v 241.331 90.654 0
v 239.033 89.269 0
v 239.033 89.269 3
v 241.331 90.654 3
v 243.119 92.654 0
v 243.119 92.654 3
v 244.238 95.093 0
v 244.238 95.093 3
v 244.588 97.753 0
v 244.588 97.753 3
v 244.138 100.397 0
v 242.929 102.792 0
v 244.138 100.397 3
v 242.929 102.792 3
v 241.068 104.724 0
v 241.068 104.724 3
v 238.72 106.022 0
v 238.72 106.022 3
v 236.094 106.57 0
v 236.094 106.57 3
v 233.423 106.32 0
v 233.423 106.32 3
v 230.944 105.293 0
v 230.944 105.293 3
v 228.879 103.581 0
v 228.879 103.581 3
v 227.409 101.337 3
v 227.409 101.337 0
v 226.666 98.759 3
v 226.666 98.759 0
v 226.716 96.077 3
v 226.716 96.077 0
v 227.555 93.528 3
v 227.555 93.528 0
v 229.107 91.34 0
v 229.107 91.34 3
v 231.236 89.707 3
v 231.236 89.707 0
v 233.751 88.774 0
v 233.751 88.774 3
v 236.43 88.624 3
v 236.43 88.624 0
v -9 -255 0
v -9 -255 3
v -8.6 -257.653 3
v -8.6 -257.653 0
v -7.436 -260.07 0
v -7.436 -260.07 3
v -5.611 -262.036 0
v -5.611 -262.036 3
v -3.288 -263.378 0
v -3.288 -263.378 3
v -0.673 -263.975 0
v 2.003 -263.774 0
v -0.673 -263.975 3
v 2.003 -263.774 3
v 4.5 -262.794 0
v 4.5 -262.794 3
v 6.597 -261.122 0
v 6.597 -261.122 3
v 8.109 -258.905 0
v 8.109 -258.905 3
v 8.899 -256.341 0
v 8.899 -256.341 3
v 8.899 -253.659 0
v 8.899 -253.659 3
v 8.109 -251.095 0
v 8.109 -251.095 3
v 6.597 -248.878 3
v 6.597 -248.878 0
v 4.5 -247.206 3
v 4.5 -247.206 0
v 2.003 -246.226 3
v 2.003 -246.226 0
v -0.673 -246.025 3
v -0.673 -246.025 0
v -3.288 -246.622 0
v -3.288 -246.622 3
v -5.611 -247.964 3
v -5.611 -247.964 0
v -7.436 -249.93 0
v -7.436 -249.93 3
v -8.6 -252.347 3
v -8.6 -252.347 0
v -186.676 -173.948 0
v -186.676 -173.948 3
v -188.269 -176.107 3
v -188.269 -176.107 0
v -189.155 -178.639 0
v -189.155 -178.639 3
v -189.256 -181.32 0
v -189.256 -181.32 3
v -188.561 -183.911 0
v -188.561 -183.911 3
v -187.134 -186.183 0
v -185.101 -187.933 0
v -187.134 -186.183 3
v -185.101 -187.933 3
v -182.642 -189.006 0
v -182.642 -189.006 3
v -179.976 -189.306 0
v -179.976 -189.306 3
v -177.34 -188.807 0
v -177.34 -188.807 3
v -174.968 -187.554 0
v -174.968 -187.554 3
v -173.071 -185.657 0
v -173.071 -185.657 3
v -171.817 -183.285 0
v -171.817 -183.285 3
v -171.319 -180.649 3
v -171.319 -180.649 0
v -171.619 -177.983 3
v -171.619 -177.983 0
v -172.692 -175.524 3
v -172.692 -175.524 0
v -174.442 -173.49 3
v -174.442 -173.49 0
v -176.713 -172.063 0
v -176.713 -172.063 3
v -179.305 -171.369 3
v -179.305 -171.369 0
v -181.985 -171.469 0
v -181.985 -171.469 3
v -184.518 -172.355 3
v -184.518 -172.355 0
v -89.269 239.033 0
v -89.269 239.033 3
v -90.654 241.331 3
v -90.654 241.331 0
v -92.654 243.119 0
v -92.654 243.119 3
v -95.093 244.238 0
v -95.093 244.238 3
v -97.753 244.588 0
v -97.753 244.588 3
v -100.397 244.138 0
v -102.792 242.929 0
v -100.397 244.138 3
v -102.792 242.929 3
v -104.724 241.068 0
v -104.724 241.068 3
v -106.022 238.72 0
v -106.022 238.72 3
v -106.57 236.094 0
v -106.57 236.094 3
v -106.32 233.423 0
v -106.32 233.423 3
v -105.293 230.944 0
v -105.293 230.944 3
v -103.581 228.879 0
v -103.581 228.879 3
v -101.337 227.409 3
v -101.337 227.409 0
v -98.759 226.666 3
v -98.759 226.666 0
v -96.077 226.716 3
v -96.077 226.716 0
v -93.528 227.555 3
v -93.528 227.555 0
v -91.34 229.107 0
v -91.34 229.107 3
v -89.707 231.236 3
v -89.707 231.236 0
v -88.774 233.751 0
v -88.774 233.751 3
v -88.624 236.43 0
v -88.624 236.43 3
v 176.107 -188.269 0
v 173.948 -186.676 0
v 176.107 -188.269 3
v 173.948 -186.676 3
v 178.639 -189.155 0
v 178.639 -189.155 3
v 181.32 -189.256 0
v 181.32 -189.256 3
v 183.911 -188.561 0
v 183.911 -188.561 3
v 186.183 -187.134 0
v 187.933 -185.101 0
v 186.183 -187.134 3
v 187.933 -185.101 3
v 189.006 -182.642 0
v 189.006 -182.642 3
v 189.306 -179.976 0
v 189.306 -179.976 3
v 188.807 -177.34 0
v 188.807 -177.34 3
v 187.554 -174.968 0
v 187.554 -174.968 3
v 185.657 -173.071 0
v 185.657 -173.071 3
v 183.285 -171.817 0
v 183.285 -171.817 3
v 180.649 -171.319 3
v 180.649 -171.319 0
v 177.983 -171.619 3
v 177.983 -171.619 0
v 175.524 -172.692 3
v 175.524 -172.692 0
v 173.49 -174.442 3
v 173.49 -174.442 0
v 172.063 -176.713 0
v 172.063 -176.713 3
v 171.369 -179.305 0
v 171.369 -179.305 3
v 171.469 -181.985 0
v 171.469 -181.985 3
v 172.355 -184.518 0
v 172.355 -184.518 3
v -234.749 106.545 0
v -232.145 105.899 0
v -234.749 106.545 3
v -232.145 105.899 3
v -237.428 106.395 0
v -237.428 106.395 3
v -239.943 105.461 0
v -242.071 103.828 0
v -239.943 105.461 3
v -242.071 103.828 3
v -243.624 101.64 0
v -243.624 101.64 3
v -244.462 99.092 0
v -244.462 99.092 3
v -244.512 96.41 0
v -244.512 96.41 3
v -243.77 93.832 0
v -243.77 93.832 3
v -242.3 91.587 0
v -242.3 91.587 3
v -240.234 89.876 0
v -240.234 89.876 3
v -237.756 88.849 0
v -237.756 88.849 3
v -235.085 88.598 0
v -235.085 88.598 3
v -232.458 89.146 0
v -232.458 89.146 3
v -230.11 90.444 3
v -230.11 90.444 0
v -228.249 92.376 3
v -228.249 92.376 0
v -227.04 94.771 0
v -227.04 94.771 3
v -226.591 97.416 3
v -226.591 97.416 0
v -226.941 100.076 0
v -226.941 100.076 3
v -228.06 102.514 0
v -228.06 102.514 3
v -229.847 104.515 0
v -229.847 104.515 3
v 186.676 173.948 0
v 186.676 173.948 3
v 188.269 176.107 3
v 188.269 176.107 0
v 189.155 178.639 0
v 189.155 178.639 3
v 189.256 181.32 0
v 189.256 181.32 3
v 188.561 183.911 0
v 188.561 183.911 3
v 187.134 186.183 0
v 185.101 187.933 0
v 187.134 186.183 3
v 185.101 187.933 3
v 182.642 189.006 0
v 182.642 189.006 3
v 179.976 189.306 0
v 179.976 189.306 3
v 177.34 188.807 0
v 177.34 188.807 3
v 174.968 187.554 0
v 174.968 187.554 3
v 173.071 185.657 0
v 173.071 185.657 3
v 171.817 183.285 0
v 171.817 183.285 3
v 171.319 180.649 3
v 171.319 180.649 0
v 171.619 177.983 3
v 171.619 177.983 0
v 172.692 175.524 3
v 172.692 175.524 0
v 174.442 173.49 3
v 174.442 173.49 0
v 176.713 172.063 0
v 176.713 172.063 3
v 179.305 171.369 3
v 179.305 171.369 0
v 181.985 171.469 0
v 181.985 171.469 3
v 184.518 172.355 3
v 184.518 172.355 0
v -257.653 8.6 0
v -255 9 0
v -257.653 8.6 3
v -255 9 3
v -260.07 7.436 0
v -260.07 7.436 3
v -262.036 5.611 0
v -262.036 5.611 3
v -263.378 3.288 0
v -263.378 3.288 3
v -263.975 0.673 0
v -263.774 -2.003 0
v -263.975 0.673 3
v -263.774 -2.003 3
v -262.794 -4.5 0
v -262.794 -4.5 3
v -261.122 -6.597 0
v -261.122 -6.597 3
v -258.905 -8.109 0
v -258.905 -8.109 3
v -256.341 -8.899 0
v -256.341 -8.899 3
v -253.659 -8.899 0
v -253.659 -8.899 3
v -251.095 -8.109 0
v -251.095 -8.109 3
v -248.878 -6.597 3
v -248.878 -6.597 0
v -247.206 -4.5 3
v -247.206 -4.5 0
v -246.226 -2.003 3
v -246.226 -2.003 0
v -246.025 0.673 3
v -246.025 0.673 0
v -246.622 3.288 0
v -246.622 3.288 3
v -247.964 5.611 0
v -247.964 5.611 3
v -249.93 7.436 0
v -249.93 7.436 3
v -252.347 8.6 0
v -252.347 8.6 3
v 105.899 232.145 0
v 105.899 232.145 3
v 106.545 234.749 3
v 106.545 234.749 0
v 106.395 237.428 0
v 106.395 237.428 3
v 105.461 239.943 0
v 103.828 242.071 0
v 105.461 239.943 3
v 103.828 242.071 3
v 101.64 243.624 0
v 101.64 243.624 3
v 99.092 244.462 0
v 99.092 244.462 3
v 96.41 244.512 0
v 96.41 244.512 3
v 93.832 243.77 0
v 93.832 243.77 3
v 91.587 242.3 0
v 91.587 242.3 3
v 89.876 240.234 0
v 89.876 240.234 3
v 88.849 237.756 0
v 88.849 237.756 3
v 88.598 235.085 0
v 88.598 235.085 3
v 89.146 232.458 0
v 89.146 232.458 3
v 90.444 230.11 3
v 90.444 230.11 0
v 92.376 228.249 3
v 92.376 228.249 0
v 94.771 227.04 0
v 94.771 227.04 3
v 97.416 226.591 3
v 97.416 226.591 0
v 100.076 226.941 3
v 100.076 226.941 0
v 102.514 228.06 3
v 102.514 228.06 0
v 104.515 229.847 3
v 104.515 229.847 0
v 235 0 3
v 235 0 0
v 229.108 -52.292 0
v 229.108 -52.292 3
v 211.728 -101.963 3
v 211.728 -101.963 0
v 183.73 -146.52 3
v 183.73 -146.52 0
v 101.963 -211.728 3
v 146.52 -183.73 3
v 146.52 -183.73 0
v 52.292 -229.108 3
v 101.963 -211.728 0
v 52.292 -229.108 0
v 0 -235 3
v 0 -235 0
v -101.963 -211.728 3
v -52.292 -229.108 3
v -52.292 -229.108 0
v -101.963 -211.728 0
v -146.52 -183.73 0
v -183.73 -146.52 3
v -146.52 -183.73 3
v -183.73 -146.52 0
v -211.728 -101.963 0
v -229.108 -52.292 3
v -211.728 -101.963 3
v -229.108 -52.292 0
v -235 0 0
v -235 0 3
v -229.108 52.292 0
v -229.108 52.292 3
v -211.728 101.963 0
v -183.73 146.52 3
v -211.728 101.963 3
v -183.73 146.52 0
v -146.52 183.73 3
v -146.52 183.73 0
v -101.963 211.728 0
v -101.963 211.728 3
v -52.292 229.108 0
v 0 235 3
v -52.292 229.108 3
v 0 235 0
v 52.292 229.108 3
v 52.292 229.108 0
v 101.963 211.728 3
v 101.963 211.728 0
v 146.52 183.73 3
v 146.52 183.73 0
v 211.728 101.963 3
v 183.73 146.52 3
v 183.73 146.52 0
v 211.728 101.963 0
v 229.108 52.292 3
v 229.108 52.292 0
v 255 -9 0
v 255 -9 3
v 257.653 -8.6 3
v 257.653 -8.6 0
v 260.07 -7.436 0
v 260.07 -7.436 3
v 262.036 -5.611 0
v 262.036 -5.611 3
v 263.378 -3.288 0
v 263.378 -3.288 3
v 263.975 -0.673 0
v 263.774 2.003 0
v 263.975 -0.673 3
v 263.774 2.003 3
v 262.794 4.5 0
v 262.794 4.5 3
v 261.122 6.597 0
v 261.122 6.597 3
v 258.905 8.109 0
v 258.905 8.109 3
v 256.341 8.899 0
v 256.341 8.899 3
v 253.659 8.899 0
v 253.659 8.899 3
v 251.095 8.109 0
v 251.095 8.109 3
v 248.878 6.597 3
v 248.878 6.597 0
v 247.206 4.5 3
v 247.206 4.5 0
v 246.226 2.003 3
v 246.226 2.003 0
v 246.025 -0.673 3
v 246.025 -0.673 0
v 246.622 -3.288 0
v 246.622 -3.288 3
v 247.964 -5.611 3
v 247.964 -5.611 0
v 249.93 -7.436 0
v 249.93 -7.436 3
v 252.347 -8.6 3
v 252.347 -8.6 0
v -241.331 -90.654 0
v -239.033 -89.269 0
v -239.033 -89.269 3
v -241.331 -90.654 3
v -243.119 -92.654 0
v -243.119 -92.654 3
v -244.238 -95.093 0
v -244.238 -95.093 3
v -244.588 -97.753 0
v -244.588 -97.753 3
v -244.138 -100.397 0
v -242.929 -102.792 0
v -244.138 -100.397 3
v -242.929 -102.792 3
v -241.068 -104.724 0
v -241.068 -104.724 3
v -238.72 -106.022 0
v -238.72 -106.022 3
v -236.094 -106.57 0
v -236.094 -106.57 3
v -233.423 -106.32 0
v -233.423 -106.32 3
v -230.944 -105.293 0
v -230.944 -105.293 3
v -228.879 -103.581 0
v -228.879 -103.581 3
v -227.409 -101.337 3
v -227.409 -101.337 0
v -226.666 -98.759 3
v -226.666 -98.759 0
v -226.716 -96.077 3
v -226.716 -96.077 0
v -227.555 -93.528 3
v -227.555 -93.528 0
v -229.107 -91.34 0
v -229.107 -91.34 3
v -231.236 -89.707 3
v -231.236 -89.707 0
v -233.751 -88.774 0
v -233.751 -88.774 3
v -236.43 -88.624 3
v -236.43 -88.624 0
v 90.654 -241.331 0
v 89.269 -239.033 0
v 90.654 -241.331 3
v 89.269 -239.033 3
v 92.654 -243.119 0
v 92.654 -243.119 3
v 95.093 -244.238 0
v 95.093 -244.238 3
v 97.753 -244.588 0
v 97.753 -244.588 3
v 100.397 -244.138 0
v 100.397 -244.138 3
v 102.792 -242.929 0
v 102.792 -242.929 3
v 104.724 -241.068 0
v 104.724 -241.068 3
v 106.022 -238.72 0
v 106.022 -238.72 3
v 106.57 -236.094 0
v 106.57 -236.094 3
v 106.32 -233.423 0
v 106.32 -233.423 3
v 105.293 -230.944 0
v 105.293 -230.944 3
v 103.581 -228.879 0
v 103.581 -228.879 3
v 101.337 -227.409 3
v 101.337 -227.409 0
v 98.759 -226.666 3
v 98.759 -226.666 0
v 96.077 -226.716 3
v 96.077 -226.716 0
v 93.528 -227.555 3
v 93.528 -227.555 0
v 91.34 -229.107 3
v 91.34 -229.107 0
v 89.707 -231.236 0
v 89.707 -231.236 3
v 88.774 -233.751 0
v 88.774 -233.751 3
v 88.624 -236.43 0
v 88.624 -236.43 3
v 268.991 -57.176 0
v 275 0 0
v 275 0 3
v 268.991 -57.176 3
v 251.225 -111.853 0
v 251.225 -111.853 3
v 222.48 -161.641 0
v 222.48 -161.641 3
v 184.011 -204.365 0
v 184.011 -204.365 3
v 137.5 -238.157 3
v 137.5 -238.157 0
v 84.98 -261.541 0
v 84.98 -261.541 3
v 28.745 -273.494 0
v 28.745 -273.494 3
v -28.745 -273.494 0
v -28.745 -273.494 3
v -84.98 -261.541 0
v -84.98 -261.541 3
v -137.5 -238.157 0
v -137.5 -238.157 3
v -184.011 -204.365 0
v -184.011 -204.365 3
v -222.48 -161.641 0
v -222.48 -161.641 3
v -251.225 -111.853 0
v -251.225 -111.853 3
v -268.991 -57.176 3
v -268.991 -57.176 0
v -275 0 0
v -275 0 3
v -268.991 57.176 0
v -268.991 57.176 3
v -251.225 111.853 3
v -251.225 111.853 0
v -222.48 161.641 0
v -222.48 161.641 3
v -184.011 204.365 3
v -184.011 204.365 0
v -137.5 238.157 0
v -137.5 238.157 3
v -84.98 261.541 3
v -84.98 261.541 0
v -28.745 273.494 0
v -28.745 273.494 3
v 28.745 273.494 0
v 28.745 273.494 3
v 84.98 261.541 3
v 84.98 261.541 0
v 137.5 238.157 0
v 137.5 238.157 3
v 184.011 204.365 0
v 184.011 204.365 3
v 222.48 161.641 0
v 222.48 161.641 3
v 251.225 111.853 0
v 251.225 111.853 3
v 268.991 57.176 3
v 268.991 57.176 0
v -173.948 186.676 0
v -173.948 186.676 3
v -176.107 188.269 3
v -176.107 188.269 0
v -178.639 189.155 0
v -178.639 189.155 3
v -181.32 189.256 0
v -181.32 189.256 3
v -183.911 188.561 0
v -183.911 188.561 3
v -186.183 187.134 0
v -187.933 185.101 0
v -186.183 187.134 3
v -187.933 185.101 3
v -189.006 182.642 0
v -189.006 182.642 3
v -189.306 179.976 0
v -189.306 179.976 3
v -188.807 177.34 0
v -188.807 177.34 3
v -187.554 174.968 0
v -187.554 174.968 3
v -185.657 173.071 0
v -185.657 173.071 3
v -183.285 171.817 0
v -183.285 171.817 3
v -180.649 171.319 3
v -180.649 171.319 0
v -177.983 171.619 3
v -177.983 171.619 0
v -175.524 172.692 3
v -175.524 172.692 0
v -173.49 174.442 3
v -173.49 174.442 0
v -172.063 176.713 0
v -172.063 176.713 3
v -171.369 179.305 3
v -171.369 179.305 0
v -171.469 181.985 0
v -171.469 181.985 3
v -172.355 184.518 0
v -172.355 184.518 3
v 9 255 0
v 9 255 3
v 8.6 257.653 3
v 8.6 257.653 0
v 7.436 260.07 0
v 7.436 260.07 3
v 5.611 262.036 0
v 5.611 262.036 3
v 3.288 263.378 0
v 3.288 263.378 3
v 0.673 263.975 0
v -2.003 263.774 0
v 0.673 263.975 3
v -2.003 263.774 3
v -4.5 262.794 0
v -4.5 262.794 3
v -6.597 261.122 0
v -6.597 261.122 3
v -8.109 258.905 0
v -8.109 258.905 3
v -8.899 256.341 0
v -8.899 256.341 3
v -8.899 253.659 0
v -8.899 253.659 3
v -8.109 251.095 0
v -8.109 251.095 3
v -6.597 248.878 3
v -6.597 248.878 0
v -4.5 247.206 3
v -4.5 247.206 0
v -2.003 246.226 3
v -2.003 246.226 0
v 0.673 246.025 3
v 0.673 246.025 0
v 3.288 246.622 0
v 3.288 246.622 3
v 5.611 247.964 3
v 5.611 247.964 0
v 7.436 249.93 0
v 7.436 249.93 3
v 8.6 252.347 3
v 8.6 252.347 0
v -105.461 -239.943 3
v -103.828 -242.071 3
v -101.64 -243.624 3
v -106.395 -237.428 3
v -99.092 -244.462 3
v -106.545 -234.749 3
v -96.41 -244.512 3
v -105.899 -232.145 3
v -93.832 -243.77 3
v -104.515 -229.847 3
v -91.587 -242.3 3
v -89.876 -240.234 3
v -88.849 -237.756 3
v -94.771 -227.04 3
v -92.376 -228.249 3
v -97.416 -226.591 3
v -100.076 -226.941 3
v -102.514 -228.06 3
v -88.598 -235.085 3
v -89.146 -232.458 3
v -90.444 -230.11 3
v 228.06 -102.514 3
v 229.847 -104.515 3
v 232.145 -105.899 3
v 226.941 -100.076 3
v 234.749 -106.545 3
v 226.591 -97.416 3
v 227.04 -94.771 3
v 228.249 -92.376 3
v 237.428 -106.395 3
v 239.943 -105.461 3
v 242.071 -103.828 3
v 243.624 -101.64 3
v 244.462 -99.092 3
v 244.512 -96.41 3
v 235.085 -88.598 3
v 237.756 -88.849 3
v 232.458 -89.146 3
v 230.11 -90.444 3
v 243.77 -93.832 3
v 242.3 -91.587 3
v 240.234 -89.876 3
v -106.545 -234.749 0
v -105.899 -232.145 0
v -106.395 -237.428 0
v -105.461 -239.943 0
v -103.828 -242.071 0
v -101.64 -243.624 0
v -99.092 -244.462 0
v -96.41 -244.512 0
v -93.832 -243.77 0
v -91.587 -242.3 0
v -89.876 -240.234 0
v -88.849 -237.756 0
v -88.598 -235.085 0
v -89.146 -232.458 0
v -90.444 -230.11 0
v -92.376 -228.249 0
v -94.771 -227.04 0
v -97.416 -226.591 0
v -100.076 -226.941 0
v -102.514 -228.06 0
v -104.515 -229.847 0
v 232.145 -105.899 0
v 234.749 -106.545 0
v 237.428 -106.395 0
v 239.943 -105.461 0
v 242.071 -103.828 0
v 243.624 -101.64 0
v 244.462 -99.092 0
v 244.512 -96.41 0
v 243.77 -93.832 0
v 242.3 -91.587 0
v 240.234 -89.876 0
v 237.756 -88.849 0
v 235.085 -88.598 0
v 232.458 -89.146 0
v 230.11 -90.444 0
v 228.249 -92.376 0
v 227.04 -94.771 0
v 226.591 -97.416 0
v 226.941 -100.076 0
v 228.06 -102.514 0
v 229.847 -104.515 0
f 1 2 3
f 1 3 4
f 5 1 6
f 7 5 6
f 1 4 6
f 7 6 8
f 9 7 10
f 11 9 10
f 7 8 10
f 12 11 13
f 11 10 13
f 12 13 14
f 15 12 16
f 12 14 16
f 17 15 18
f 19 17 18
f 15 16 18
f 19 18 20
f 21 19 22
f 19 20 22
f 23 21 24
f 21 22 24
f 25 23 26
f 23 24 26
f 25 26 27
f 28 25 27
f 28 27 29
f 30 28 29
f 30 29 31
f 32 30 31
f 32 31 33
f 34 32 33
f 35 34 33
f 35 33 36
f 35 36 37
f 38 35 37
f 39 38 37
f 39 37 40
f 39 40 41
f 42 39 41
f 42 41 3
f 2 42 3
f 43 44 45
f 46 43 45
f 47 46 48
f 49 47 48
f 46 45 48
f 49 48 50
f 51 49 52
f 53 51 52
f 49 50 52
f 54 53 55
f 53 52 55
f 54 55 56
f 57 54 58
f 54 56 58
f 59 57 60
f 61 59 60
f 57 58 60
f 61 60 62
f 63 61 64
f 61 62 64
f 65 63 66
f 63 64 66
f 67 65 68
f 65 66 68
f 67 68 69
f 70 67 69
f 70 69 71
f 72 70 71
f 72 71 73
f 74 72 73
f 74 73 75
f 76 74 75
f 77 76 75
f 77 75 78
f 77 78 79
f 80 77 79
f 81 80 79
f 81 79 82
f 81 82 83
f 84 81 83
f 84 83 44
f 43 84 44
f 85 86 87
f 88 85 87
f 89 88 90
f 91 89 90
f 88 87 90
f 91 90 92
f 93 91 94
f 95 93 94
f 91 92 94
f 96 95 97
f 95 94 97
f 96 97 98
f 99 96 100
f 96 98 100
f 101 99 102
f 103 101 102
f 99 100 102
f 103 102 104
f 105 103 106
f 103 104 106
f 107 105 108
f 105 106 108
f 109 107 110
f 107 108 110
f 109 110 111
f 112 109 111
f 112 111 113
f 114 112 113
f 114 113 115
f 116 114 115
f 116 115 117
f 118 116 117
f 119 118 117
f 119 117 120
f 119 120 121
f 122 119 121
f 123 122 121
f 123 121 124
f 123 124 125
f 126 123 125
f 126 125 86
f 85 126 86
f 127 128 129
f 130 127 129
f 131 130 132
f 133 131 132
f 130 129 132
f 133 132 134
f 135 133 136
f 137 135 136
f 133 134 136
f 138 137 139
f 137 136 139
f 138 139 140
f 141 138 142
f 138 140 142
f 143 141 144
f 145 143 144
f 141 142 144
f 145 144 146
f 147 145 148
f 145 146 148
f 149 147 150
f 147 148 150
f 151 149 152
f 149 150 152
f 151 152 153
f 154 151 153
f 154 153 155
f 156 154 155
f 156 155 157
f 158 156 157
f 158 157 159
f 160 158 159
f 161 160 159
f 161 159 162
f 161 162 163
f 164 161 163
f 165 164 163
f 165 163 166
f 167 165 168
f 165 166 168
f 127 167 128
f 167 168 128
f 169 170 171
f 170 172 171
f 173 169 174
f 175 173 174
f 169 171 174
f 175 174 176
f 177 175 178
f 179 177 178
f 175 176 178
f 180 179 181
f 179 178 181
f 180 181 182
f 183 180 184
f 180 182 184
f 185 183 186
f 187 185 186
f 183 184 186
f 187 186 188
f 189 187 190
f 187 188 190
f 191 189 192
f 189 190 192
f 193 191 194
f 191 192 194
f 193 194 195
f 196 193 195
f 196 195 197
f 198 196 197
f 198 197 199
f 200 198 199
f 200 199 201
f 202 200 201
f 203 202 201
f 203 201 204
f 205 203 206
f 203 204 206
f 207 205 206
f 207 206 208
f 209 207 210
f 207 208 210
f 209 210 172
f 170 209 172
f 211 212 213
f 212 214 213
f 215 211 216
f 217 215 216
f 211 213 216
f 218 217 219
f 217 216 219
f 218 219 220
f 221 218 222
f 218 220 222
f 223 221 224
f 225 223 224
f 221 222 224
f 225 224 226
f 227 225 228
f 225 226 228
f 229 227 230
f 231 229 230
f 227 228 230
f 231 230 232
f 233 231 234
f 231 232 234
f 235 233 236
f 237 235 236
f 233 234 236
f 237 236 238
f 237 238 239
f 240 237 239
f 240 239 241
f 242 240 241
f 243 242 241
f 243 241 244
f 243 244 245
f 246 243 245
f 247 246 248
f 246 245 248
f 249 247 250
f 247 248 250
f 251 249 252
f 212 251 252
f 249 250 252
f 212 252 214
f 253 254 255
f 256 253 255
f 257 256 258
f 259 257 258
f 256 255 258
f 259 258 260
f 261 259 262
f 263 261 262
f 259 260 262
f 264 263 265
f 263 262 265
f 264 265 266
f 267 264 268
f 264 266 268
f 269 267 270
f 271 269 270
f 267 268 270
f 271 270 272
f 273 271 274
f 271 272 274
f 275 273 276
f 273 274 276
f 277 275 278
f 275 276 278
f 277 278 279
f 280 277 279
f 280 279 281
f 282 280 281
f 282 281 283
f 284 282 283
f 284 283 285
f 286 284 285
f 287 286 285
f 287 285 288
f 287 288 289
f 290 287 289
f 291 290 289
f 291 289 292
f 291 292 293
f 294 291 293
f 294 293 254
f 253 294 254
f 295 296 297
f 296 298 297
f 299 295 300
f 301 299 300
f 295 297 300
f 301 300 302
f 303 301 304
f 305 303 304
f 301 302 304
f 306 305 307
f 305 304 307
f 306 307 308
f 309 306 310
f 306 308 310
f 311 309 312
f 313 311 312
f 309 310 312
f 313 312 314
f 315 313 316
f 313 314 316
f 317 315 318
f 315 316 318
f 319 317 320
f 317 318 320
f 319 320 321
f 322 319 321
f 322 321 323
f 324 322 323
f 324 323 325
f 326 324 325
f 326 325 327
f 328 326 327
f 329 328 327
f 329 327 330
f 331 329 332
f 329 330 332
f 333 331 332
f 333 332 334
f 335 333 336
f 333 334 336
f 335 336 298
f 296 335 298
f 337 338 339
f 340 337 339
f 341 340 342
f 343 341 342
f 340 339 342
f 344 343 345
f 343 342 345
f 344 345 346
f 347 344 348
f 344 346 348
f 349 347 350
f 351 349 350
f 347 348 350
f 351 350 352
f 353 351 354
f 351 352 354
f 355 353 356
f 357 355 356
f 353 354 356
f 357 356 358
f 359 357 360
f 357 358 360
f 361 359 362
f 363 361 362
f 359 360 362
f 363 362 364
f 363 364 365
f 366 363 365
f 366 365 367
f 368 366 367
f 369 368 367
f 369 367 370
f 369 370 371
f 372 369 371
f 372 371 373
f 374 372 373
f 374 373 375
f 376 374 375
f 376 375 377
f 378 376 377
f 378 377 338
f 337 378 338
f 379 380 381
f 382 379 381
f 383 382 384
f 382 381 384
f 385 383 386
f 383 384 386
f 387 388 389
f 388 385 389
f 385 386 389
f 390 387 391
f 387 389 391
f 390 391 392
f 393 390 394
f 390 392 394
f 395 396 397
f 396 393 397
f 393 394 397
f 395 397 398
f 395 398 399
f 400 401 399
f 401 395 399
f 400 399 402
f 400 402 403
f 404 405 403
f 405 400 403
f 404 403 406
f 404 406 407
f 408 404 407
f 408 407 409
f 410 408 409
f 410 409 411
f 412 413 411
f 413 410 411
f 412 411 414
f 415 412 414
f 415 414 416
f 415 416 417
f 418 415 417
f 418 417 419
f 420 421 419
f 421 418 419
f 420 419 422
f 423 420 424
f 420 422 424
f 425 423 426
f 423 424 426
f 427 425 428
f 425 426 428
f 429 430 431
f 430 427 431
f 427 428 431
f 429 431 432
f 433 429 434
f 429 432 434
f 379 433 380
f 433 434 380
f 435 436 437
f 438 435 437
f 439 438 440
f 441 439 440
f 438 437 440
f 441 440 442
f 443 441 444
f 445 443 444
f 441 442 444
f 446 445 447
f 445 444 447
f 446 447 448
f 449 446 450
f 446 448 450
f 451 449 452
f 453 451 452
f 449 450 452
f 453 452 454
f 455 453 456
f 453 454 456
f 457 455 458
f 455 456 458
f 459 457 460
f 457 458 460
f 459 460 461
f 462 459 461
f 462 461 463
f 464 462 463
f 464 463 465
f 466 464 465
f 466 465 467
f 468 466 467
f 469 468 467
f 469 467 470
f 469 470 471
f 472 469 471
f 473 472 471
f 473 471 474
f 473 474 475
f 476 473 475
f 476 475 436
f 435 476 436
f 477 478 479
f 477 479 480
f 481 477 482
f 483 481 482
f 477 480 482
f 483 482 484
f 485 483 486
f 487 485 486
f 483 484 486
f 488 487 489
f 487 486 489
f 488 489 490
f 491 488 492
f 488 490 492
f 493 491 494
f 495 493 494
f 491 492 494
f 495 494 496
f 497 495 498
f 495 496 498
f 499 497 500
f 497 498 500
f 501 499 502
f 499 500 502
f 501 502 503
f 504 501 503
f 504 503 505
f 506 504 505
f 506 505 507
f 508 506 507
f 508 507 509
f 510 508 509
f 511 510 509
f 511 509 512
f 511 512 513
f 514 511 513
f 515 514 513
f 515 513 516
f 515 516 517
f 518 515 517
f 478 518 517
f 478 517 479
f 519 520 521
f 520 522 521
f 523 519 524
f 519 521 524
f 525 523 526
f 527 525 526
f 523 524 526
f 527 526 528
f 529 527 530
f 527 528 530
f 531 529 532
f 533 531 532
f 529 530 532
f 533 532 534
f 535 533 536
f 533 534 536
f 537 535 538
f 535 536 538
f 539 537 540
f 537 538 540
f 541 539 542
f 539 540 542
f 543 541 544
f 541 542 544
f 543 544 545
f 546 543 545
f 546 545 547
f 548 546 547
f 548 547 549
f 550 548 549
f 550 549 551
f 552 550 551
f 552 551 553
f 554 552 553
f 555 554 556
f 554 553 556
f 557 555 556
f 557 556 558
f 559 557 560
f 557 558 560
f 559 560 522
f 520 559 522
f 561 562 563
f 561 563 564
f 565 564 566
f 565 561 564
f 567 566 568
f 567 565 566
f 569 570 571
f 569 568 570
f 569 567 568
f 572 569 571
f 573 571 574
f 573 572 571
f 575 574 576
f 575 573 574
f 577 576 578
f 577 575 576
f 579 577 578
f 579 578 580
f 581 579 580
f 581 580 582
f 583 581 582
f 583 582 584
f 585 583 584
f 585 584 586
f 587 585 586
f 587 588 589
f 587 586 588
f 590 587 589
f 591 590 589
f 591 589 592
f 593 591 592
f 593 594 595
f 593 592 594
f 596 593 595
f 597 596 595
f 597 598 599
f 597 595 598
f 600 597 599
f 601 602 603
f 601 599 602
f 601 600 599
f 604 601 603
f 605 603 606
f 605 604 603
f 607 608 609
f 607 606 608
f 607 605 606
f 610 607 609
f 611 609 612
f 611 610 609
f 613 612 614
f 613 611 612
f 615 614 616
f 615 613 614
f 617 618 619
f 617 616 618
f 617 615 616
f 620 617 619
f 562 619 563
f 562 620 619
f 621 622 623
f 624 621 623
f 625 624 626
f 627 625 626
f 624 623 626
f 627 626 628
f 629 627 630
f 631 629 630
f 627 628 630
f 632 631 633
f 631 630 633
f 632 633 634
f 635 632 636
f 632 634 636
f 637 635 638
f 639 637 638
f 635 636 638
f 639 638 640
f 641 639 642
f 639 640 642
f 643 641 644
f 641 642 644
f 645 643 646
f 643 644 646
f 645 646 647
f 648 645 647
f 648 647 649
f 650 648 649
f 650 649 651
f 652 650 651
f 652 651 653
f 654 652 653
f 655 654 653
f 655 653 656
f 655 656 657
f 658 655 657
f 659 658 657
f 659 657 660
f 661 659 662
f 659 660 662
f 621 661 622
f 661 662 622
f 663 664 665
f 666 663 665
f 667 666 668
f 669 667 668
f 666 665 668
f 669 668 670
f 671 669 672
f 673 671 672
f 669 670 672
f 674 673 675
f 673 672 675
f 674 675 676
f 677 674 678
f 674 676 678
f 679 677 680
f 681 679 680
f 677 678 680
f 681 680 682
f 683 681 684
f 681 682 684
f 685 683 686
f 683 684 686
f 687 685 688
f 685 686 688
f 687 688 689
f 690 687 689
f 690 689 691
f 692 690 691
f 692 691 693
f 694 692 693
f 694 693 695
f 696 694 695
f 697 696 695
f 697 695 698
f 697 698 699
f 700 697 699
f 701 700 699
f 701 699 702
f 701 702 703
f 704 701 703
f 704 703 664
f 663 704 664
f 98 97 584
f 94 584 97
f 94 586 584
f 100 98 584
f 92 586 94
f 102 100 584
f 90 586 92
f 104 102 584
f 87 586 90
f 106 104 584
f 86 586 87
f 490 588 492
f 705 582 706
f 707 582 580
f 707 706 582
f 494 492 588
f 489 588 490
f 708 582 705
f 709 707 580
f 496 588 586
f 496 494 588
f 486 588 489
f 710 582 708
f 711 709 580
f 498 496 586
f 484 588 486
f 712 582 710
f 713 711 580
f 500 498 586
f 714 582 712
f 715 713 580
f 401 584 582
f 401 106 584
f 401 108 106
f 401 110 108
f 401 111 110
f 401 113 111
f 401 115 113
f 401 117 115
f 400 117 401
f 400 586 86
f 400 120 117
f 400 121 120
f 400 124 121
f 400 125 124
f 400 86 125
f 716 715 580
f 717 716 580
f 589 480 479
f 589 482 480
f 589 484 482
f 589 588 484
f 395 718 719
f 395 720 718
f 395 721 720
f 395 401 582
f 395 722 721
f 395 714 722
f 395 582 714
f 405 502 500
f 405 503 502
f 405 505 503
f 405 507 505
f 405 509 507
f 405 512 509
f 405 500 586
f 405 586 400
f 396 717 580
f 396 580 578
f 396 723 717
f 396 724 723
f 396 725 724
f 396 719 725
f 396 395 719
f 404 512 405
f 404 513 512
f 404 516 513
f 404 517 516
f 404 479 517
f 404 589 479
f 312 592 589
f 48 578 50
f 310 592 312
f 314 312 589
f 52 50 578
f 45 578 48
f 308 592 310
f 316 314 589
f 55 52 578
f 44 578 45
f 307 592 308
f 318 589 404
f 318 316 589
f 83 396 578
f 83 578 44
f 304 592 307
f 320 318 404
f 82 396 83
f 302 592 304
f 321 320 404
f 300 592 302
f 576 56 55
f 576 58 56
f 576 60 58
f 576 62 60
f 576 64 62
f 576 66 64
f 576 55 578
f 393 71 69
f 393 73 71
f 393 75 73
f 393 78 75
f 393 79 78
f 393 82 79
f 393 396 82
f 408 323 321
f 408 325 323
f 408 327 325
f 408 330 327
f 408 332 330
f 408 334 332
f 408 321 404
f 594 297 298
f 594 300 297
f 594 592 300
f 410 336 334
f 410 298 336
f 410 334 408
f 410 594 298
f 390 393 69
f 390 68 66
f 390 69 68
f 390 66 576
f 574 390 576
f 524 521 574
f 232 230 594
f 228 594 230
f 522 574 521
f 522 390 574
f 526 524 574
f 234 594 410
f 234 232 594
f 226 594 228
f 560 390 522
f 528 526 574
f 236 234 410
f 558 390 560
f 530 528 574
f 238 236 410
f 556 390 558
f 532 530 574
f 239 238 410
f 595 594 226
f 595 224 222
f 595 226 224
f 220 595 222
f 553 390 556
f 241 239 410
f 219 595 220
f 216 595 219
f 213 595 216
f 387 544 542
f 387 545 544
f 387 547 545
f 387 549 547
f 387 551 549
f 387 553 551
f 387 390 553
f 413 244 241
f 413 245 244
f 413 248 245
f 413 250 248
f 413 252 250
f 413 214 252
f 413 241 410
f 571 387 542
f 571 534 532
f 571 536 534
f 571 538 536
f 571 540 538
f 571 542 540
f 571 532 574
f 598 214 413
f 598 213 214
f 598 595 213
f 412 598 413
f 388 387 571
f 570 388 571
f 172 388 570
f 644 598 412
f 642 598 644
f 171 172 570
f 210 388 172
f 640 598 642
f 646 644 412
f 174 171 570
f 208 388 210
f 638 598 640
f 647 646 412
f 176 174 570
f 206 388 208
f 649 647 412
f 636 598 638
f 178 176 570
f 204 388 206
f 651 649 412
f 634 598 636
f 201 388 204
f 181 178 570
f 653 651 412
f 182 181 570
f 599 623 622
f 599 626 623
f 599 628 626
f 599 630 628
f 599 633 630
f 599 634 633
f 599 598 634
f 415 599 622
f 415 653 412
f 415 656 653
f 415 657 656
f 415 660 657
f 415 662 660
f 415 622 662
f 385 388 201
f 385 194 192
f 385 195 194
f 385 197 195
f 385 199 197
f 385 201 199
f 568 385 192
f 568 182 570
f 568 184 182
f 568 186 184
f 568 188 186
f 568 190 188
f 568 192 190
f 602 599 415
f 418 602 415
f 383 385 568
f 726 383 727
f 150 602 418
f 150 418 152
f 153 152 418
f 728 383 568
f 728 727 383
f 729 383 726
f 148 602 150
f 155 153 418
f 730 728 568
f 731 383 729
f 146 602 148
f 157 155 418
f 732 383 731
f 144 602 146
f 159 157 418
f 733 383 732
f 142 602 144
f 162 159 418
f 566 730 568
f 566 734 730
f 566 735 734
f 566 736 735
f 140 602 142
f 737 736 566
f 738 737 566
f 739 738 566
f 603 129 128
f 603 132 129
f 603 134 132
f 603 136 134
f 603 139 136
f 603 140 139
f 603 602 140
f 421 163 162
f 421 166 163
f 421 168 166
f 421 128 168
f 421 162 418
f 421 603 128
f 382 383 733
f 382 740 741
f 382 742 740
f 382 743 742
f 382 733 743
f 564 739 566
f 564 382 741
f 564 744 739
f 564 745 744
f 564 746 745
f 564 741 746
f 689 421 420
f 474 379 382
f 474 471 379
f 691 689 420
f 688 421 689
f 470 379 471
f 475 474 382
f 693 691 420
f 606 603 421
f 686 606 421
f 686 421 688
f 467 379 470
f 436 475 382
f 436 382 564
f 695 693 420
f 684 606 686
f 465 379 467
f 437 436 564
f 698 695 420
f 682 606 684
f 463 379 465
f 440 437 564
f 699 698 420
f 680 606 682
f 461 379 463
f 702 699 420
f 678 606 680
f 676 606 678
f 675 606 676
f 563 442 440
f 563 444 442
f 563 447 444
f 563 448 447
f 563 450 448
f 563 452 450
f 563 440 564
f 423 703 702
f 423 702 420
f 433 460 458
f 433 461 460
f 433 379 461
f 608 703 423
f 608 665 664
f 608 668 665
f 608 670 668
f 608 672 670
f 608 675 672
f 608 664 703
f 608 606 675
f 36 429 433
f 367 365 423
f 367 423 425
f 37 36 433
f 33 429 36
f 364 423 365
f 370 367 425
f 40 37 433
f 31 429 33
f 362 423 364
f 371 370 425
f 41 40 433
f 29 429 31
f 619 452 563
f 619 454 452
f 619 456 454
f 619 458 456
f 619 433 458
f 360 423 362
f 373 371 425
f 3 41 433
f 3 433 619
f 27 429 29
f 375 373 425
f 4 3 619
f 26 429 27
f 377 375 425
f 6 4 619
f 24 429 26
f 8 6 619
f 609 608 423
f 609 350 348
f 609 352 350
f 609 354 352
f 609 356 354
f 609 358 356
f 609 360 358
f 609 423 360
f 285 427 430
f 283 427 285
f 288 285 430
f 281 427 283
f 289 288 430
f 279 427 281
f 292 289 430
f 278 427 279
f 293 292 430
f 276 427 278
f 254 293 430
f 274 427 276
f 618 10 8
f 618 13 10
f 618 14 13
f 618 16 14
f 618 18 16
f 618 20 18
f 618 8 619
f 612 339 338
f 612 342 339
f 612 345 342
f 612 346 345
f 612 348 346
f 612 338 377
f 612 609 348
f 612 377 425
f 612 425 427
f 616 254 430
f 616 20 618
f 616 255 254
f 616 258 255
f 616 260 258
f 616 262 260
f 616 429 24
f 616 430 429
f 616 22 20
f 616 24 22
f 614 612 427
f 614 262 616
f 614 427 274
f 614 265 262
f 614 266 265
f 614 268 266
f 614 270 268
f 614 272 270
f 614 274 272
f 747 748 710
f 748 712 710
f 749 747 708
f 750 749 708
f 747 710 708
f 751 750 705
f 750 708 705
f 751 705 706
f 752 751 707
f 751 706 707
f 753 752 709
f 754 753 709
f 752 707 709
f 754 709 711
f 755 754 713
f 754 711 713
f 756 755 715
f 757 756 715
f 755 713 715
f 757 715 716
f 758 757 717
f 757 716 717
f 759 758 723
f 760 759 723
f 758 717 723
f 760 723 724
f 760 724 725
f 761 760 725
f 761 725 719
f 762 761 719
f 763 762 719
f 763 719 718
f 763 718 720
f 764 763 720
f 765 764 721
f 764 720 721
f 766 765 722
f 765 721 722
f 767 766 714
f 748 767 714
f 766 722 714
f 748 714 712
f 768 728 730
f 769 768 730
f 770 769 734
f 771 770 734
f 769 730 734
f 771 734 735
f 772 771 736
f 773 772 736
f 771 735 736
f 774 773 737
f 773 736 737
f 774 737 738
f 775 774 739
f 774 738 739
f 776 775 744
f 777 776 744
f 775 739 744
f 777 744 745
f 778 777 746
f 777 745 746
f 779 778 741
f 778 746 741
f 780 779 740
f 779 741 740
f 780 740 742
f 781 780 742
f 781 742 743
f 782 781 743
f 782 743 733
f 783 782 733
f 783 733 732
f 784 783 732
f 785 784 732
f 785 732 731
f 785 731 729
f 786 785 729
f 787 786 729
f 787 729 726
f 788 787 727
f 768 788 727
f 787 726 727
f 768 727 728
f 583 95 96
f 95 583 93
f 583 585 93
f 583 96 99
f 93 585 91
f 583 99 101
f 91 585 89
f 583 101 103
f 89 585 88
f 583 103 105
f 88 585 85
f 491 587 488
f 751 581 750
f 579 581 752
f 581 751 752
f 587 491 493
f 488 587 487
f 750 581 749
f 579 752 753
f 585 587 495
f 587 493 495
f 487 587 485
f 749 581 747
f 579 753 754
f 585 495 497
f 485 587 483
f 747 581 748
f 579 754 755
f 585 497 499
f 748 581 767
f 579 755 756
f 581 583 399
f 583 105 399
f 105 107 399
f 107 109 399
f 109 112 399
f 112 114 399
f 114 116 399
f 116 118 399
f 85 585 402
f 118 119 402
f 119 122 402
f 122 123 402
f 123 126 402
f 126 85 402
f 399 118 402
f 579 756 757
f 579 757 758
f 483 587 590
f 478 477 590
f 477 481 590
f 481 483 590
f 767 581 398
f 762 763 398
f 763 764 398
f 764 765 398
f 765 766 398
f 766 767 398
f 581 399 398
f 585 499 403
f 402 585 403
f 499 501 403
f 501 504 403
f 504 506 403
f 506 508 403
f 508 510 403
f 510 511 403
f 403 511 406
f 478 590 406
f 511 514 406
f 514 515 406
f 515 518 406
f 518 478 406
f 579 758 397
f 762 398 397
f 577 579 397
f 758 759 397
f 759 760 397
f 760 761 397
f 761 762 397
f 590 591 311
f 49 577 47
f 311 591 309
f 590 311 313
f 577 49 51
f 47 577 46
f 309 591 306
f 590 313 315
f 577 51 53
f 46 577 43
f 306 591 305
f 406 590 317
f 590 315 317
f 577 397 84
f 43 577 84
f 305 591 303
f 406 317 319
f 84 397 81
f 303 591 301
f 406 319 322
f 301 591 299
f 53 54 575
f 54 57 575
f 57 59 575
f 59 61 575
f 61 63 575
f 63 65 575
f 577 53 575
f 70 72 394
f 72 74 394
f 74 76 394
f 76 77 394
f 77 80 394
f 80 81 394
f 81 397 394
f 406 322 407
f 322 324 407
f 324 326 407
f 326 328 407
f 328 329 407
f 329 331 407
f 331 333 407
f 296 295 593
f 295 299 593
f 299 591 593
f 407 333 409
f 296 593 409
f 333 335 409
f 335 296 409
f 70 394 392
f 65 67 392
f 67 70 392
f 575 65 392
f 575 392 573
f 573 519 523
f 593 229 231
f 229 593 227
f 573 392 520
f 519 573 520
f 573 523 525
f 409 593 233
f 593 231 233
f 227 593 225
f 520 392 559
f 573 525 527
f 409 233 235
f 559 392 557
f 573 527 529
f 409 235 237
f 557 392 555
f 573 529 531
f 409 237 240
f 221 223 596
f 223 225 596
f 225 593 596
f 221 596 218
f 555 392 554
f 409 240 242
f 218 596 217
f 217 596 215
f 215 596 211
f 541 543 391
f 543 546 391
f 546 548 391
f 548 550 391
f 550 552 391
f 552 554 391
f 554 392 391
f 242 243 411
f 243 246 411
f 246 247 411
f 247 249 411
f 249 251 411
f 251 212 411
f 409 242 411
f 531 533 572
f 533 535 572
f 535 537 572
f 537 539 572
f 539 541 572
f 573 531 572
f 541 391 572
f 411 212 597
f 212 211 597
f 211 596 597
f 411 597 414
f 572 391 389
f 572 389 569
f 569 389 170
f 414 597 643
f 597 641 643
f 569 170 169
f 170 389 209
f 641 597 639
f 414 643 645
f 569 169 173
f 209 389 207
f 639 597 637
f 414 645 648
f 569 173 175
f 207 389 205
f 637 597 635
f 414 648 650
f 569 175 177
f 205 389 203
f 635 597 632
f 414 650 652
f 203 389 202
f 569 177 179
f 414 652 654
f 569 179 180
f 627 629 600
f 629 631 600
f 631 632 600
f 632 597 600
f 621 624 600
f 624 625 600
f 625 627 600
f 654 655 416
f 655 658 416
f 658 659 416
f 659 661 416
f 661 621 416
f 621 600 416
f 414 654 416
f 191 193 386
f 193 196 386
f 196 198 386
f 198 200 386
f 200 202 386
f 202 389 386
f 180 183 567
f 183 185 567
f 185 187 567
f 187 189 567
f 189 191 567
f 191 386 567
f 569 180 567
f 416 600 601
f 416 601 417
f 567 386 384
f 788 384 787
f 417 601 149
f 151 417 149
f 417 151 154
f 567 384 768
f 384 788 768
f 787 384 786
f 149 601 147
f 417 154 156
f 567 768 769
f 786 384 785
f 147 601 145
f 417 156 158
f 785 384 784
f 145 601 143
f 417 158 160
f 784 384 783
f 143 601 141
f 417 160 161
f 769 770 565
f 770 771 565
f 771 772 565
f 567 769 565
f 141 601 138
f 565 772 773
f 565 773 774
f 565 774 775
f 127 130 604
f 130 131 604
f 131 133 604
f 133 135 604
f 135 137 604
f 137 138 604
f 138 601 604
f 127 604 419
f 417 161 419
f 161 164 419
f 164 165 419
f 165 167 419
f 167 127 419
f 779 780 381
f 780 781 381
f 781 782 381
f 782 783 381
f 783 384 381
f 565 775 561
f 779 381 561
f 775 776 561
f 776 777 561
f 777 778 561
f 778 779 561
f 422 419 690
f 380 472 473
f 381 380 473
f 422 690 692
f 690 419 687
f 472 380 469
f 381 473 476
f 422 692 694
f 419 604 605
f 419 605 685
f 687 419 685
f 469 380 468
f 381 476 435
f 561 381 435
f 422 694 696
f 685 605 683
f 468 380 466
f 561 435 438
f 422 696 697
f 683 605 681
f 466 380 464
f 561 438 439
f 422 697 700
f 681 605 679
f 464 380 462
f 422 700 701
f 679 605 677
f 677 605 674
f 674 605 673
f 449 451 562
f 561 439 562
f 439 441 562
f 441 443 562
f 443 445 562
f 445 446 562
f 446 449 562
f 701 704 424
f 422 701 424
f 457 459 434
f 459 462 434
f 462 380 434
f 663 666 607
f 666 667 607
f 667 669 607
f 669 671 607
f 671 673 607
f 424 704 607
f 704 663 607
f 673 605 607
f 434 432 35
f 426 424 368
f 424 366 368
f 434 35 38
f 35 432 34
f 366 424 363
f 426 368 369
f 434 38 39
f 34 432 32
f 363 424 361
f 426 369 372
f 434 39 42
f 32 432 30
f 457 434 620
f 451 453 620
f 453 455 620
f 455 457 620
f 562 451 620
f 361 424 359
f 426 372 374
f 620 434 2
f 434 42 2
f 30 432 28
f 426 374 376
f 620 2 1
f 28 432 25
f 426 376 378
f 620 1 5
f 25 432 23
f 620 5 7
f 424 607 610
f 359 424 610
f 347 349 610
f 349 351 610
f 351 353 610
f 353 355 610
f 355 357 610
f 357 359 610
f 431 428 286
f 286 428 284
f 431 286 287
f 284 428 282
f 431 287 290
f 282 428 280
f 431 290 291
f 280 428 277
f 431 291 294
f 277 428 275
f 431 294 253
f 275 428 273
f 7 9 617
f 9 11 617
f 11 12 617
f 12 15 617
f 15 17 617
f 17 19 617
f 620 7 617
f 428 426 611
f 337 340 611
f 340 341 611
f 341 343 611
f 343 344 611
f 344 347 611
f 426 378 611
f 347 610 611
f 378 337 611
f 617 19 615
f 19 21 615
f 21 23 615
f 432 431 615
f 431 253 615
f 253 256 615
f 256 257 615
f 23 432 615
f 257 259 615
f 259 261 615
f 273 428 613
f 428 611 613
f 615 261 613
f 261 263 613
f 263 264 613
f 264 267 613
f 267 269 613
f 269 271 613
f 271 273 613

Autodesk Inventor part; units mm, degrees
ref_plane "YZ Plane" through (0, 0, 0) normal (1, 0, 0) x (0, 1, 0)
ref_plane "XZ Plane" through (0, 0, 0) normal (0, 1, 0) x (-1, 0, 0)
ref_plane "XY Plane" through (0, 0, 0) normal (0, 0, 1) x (1, 0, 0)
sketch "Sketch1" plane through (0, 0, 0) normal (0, 0, 1) x (1, 0, 0)
  circle A0 centre (0, 0) radius 235
  circle A1 centre (0, 0) radius 275
  circle A2 centre (0, 0) radius 255 construction
  line L0 (0, 275) -> (0, 235) construction
  point P0 (0, 255)
  dimension "d9" = 510
  dimension "d10" = 40
extrude "Plate1" add sketch "Sketch1" along normal blind 3
sketch "Sketch2" plane through (0, 0, 3) normal (0, 0, 1) x (1, 0, 0)
  circle A0 centre (0, 0) radius 235 construction
  circle A1 centre (0, 0) radius 275 construction
  line L0 (0, 275) -> (0, 235) construction
  circle A2 centre (0, 255) radius 9
  dimension "d3" = 18
extrude "Extrusion1" cut sketch "Sketch2" against normal through all
pattern_circular "Circular Pattern1" count 16 over 360 about axis through (0, 0, 0) along (0, 0, 1) of "Extrusion1"
equation "\"d9\" = Шпил_пласт_диам_центров"
equation "\"d10\" = Шпил_пласт_ширина"
equation "\"d2\" = Thickness"
equation "\"BendRadius\" = Thickness"
equation "\"BendReliefWidth\" = Thickness"
equation "\"BendReliefDepth\" = 0.5 * Thickness"
equation "\"CornerReliefSize\" = 4 * Thickness"
equation "\"MinimumRemnant\" = 2 * Thickness"
equation "\"TransitionRadius\" = BendRadius"
equation "\"JacobiRadiusSize\" = BendRadius"
equation "\"GapSize\" = Thickness"
equation "\"Шпил_пласт_диам_центров\" = 510"
equation "\"Шпил_пласт_ширина\" = 40"
equation "\"Thickness\" = 3"
properties part number "ДМС 090 прокладка лицо"
